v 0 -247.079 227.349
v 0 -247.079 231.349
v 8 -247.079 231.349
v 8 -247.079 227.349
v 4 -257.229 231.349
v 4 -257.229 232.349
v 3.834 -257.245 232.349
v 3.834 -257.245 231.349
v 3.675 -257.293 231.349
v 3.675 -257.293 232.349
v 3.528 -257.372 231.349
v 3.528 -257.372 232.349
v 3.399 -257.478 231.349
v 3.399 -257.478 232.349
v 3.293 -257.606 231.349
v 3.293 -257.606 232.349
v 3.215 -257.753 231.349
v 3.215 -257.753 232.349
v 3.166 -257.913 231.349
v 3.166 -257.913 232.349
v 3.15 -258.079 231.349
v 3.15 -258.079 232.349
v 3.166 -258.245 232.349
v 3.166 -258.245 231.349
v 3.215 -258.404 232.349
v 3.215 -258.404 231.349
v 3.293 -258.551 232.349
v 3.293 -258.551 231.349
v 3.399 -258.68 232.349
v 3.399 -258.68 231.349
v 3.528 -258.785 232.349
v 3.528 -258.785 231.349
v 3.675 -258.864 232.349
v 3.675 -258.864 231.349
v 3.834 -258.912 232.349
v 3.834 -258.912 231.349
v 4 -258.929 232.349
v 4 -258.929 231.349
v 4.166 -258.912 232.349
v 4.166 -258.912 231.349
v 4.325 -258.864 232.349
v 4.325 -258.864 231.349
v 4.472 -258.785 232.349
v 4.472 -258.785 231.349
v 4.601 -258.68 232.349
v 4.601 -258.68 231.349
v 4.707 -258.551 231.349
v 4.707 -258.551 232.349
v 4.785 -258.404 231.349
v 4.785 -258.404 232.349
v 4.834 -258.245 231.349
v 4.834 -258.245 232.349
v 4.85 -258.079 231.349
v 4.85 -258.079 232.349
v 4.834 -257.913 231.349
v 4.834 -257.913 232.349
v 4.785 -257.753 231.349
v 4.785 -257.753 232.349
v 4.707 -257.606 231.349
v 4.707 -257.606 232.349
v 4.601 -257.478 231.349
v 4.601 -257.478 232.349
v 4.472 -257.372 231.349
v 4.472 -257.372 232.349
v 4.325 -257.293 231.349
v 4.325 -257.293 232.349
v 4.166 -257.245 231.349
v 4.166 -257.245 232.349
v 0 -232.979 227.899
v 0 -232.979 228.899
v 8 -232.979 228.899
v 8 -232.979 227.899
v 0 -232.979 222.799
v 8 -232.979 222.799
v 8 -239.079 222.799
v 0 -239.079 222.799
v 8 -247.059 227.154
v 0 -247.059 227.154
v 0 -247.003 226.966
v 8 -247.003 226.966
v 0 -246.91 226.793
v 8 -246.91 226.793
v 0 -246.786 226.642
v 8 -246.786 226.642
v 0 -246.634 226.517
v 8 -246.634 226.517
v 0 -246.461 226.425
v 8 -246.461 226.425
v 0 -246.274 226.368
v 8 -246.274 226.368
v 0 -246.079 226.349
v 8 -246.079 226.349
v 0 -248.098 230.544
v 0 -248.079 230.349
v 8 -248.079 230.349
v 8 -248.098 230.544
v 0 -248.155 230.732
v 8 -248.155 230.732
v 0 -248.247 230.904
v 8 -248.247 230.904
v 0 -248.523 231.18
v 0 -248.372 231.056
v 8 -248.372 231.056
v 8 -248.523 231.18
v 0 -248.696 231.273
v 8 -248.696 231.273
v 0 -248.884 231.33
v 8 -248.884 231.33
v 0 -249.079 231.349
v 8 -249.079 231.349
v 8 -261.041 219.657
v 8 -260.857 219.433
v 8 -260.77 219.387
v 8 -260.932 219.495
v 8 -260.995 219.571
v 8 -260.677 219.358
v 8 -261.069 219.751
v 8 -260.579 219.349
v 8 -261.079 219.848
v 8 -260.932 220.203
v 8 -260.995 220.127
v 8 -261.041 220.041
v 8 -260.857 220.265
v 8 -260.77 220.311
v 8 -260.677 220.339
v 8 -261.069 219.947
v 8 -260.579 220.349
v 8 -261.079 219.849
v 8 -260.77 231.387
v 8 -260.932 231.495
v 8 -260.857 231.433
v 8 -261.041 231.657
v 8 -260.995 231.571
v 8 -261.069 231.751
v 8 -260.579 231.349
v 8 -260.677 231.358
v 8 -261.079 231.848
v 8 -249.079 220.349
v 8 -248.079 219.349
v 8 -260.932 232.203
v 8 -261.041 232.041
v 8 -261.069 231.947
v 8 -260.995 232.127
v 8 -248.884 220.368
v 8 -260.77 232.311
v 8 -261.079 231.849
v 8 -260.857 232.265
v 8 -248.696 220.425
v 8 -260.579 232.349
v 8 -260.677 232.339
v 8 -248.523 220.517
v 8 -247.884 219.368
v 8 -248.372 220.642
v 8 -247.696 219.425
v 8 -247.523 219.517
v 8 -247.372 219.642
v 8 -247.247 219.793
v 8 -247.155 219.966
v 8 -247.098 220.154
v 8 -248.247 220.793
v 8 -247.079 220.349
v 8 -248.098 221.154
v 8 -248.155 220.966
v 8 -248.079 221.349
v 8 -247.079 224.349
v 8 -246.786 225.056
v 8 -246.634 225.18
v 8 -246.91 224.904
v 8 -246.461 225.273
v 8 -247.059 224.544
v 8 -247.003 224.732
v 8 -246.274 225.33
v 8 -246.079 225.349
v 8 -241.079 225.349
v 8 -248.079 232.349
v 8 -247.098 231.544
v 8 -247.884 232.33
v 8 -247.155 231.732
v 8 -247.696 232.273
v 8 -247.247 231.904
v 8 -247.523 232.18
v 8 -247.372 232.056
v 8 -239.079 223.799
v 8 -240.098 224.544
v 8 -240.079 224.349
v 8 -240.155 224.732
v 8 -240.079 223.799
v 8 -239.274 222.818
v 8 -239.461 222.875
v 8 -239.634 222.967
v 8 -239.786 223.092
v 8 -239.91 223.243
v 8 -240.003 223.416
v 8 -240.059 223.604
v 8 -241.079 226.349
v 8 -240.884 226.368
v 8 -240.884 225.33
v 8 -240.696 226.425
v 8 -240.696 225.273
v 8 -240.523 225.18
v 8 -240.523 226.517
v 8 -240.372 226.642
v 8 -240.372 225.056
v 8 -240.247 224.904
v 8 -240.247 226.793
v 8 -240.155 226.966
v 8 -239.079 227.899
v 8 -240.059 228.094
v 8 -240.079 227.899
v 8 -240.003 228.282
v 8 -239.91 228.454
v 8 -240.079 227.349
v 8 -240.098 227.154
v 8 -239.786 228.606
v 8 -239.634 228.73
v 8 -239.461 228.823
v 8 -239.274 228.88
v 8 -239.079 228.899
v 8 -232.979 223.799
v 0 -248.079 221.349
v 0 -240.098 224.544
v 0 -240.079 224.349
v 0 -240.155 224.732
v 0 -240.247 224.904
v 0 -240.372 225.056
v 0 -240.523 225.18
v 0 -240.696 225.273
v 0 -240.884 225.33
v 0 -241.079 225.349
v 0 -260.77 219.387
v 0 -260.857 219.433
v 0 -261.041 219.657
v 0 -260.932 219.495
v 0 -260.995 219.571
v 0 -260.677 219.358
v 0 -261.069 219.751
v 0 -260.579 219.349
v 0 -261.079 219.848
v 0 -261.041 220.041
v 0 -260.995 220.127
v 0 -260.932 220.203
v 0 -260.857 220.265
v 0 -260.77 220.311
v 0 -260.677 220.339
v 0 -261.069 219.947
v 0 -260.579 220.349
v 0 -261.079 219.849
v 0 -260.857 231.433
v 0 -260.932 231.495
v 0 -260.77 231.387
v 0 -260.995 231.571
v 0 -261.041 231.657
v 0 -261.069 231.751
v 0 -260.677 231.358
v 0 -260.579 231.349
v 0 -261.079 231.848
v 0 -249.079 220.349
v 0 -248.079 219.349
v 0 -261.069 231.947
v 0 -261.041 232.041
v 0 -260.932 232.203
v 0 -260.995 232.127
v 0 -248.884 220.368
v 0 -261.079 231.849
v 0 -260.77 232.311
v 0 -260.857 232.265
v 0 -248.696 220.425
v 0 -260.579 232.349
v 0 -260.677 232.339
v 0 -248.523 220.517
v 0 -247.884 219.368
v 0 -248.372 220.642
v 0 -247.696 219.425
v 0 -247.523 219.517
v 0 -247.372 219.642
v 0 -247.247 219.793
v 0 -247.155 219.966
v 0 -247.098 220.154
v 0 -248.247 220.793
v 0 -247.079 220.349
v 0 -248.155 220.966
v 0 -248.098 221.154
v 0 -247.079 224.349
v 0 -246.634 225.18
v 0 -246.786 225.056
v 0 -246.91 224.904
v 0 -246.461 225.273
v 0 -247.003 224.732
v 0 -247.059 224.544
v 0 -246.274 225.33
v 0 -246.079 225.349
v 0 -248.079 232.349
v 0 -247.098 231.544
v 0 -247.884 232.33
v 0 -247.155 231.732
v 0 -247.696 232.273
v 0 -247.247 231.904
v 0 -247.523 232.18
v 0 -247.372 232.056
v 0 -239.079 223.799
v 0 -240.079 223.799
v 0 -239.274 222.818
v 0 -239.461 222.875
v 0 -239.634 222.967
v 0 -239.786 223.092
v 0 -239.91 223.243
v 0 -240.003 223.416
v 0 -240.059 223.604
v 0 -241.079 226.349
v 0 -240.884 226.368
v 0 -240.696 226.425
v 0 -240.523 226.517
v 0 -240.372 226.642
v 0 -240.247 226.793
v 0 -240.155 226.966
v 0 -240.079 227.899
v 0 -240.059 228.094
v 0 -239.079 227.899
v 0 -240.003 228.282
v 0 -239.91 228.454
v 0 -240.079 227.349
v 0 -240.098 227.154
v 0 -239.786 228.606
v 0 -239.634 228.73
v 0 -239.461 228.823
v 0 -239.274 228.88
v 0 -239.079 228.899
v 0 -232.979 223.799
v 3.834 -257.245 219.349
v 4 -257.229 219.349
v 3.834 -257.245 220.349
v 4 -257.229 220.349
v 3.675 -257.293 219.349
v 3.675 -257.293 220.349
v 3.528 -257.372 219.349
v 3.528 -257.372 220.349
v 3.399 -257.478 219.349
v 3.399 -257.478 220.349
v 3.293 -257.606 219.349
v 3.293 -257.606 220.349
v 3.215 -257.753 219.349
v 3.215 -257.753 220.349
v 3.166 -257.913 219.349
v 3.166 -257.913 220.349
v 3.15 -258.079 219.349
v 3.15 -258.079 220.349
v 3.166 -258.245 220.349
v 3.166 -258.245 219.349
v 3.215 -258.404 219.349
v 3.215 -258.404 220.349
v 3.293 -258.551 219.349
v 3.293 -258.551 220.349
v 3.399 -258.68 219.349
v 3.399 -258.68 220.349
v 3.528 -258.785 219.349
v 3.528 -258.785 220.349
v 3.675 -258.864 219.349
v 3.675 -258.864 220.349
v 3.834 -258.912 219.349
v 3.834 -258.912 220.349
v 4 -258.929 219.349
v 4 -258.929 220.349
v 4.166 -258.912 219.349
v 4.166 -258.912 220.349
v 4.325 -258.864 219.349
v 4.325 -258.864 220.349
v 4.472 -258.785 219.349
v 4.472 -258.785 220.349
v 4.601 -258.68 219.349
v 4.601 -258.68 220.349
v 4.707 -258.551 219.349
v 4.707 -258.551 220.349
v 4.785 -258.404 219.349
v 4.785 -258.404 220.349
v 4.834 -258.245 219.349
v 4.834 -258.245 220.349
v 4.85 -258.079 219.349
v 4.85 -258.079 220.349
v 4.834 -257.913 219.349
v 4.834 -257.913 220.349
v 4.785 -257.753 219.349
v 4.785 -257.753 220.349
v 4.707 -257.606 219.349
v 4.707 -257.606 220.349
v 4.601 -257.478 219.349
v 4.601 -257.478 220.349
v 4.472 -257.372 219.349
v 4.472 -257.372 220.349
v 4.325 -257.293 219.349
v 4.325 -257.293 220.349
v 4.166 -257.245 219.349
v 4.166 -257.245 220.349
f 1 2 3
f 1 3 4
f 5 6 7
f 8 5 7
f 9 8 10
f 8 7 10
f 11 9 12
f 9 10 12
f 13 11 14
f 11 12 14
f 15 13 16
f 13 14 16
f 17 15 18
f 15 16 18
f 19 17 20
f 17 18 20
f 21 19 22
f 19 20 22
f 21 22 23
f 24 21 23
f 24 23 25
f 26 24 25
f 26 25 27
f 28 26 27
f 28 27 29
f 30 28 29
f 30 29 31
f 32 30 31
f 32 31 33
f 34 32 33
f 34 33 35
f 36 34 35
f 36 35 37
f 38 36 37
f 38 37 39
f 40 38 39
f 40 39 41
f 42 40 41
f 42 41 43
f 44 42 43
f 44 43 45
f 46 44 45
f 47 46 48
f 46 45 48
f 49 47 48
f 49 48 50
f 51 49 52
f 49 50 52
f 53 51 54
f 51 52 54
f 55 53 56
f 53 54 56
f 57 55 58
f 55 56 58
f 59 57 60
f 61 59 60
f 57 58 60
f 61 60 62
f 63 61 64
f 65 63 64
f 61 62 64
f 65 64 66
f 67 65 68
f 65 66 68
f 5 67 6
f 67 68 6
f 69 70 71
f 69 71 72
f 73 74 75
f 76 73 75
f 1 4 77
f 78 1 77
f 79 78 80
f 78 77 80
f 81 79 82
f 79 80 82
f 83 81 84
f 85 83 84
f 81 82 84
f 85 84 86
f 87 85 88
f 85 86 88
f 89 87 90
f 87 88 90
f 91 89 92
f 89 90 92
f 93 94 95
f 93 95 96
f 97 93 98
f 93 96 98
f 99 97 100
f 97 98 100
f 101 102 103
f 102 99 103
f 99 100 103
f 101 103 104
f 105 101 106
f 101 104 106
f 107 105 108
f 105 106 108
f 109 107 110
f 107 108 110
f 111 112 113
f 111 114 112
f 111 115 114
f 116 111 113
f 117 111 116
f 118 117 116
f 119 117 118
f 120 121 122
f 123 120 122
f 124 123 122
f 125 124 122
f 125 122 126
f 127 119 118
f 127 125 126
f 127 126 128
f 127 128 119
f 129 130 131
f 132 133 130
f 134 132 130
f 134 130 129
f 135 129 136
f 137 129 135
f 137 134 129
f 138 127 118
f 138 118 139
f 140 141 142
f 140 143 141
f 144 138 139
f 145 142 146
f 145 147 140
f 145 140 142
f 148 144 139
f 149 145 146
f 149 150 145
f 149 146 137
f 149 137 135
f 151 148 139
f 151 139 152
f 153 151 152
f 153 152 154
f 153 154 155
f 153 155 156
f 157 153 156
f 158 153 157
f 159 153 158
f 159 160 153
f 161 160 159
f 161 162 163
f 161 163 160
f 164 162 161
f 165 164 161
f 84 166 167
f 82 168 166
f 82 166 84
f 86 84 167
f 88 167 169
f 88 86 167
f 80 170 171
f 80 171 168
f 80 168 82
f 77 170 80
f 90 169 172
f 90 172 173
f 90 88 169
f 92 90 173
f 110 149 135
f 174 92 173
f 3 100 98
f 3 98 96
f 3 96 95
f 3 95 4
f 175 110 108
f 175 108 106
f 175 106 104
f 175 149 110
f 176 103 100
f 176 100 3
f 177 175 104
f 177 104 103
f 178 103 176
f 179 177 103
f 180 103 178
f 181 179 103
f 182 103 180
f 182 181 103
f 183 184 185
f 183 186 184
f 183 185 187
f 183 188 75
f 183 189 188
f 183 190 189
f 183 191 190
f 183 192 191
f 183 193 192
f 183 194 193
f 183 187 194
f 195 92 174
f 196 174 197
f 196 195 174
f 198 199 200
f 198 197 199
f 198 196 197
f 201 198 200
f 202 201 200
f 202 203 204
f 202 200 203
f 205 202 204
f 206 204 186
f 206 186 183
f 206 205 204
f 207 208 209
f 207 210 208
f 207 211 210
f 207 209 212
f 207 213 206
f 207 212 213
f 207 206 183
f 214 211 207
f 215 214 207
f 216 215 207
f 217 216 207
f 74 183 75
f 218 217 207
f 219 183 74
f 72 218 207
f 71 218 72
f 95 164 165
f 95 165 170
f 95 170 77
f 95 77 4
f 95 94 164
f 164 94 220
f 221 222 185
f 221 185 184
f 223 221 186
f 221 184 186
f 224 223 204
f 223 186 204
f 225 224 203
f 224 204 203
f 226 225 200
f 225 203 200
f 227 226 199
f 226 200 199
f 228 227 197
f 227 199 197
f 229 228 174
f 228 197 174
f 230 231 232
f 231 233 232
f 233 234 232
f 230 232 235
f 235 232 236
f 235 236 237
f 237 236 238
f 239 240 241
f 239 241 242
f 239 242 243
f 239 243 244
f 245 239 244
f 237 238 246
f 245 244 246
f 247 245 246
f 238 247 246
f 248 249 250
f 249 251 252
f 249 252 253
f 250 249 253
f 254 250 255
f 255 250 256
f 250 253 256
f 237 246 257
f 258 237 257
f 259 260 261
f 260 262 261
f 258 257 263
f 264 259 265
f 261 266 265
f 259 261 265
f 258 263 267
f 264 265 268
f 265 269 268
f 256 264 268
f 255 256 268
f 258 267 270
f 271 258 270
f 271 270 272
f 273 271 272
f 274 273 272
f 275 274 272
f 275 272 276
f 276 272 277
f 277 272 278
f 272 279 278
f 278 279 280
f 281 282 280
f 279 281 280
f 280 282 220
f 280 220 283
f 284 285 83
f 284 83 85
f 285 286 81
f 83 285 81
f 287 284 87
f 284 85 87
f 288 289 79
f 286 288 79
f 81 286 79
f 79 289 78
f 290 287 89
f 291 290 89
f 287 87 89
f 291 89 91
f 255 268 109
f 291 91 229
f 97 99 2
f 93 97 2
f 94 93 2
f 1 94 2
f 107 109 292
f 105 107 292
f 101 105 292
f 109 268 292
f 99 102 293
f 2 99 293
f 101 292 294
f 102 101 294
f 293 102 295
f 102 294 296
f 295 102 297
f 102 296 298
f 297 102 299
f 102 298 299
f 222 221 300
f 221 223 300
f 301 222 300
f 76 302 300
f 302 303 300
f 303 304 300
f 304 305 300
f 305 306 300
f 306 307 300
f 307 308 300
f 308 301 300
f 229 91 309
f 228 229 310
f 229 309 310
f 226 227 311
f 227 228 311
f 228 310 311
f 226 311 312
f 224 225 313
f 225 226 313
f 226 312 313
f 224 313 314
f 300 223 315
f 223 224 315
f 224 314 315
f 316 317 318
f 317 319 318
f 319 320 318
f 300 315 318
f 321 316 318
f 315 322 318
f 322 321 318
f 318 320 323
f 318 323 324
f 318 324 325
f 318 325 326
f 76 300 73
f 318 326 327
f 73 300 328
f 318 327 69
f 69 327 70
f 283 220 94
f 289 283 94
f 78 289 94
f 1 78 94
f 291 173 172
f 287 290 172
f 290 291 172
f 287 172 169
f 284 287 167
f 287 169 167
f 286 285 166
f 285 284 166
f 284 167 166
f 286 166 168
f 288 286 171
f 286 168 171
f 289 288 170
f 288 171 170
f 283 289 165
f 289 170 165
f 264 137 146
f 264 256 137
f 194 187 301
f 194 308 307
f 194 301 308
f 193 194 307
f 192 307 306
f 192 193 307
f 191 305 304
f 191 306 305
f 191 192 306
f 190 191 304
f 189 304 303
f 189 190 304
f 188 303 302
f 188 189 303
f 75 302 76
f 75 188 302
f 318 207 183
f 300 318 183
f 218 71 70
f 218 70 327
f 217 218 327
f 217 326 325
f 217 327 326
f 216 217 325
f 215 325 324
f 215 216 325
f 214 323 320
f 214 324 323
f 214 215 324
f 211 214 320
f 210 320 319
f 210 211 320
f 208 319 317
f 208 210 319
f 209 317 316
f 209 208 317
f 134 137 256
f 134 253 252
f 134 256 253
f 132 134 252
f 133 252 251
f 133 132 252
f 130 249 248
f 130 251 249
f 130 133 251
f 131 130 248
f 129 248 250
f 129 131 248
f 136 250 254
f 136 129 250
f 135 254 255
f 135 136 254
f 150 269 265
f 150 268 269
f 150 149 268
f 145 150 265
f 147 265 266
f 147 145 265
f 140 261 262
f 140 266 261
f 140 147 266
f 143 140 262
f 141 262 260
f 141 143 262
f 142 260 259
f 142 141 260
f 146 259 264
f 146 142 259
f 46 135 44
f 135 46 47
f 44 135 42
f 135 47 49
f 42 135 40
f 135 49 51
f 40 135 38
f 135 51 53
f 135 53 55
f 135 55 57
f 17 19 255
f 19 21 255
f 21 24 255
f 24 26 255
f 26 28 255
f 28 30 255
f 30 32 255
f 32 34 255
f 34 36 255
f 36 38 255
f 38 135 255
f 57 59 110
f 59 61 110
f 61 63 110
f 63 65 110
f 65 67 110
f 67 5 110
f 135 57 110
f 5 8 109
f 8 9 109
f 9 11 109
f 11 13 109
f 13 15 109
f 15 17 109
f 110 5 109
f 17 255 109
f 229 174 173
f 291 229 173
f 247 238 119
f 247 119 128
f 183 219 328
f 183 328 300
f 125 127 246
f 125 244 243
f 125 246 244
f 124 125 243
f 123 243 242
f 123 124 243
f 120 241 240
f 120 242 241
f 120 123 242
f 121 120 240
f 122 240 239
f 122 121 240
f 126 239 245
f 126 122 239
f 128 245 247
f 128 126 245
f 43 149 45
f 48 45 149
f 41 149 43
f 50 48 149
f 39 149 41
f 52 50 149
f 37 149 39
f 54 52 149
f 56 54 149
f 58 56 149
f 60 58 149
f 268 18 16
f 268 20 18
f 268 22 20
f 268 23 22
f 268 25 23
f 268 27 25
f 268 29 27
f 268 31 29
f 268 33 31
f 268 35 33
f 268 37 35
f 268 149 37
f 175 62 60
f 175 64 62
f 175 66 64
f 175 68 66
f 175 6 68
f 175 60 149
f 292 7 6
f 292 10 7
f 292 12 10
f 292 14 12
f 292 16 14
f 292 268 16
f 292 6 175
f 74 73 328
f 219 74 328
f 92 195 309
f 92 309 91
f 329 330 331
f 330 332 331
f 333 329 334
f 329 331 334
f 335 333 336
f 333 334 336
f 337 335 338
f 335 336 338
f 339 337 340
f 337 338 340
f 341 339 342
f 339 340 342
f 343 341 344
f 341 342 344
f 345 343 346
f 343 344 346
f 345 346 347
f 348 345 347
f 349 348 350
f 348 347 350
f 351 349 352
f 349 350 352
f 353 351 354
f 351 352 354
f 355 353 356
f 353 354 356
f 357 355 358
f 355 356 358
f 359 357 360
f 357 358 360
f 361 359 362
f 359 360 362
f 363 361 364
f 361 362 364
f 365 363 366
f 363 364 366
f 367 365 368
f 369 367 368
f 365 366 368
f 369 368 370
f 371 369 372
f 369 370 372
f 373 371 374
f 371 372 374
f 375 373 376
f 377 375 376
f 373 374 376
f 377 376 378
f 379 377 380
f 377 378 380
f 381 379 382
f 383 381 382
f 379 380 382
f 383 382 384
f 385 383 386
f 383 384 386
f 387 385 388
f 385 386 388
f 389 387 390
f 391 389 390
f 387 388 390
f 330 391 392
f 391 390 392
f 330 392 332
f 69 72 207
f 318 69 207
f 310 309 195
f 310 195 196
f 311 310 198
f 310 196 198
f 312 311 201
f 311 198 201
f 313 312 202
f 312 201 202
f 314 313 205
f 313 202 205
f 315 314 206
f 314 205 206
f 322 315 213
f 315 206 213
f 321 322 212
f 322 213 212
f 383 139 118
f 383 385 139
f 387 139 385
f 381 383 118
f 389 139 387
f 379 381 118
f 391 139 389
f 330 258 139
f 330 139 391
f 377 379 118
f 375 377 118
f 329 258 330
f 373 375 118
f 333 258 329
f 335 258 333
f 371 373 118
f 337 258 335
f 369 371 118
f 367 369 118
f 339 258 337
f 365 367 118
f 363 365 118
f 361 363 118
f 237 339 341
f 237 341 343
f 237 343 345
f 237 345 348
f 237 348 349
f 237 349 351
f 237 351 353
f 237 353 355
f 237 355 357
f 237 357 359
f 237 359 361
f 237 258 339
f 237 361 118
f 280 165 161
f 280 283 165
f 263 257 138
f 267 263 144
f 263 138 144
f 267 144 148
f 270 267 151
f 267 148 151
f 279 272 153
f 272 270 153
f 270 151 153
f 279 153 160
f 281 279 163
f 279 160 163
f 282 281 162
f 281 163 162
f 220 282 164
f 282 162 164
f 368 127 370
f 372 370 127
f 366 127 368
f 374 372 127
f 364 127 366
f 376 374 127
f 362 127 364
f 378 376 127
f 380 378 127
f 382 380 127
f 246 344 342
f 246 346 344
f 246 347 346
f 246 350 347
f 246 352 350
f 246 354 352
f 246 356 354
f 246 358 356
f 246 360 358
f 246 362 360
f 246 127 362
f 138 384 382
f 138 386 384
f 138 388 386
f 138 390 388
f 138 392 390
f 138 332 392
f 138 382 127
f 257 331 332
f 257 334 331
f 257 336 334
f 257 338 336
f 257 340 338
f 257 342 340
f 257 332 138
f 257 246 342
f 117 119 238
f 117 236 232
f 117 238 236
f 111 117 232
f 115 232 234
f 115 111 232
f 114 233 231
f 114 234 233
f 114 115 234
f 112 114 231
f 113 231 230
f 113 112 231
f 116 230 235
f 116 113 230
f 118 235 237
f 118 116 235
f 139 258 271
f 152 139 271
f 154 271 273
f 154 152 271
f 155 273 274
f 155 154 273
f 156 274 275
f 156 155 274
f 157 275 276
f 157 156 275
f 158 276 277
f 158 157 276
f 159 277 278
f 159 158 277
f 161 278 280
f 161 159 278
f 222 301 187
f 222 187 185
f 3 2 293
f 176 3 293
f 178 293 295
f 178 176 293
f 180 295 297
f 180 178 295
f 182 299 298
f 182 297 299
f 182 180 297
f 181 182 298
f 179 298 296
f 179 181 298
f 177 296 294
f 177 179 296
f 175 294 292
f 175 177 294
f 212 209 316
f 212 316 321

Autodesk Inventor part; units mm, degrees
ref_plane "YZ Plane" through (0, 0, 0) normal (1, 0, 0) x (0, 1, 0)
ref_plane "XZ Plane" through (0, 0, 0) normal (0, 1, 0) x (-1, 0, 0)
ref_plane "XY Plane" through (0, 0, 0) normal (0, 0, 1) x (1, 0, 0)
sketch "Sketch1" plane through (0, 0, 0) normal (1, 0, 0) x (0, 1, 0)
  line L0 (-232.9787, 228.8989) -> (-240.0787, 228.8989)
  line L1 (-240.0787, 228.8989) -> (-240.0787, 226.3489)
  line L2 (-240.0787, 226.3489) -> (-247.0787, 226.3489)
  line L3 (-261.0787, 231.3489) -> (-248.0787, 231.3489)
  line L4 (-232.9787, 228.8989) -> (-232.9787, 227.8989)
  line L5 (-232.9787, 227.8989) -> (-239.0787, 227.8989)
  line L6 (-239.0787, 227.8989) -> (-239.0787, 227.8489)
  line L7 (-258.789, 225.8489) -> (279.9992, 225.8489) construction
  line L8 (-232.9787, 222.7989) -> (-240.0787, 222.7989)
  line L9 (-240.0787, 222.7989) -> (-240.0787, 225.3489)
  line L10 (-240.0787, 225.3489) -> (-247.0787, 225.3489)
  line L11 (-261.0787, 220.3489) -> (-248.0787, 220.3489)
  line L12 (-232.9787, 222.7989) -> (-232.9787, 223.7989)
  line L13 (-232.9787, 223.7989) -> (-239.0787, 223.7989)
  line L14 (-239.0787, 223.7989) -> (-239.0787, 227.8489)
  line L15 (-248.0787, 231.3489) -> (-248.0787, 220.3489)
  line L16 (-261.0787, 231.3489) -> (-261.0787, 232.3489)
  line L17 (-261.0787, 232.3489) -> (-247.0787, 232.3489)
  line L18 (-247.0787, 232.3489) -> (-247.0787, 226.3489)
  line L19 (-247.0787, 225.3489) -> (-247.0787, 219.3489)
  line L20 (-247.0787, 219.3489) -> (-261.0787, 219.3489)
  line L21 (-261.0787, 219.3489) -> (-261.0787, 220.3489)
  point P0 (0, 0)
  dimension "d4" = 1
  dimension "d6" = 4.1
  dimension "d9" = 1
  dimension "d10" = 1
  dimension "d13" = 6.1
  dimension "d14" = 11
  dimension "d15" = 1
  dimension "d16" = 1
  dimension "d17" = 1
  dimension "d29" = 13
  dimension "d32" = 7
extrude "Extrusion1" add sketch "Sketch1" along normal blind 8
sketch "Sketch2" plane through (0, -261.0787, 219.3489) normal (0, 0, -1) x (-1, 0, 0)
  line L0 (0, 14) -> (-8, 14) projected
  line L1 (0, 0) -> (0, 14) projected
  point P0 (0, 261.0787)
  point P1 (-4, 3)
  dimension "d25" = 11
  dimension "d26" = 4
  dimension "d27" = 8
  dimension "d28" = 14
hole "Hole1" at (4, -258.0787, 219.3489) direction (0, 0, 1) diameter 1.7 end through all
fillet "Fillet1" radius 0.5 4 edges at (4, -261.0787, 231.3489) (4, -261.0787, 232.3489) (4, -261.0787, 220.3489) (4, -261.0787, 219.3489)
fillet "Fillet2" radius 1 10 edges at (4, -247.0787, 232.3489) (4, -248.0787, 231.3489) (4, -247.0787, 219.3489) (4, -248.0787, 220.3489) (4, -247.0787, 225.3489) (4, -247.0787, 226.3489) (4, -240.0787, 226.3489) (4, -240.0787, 222.7989) (4, -240.0787, 225.3489) (4, -240.0787, 228.8989)
equation "\"d26\" = 0.5 * d27"
properties part number "back_wheel_interface"
